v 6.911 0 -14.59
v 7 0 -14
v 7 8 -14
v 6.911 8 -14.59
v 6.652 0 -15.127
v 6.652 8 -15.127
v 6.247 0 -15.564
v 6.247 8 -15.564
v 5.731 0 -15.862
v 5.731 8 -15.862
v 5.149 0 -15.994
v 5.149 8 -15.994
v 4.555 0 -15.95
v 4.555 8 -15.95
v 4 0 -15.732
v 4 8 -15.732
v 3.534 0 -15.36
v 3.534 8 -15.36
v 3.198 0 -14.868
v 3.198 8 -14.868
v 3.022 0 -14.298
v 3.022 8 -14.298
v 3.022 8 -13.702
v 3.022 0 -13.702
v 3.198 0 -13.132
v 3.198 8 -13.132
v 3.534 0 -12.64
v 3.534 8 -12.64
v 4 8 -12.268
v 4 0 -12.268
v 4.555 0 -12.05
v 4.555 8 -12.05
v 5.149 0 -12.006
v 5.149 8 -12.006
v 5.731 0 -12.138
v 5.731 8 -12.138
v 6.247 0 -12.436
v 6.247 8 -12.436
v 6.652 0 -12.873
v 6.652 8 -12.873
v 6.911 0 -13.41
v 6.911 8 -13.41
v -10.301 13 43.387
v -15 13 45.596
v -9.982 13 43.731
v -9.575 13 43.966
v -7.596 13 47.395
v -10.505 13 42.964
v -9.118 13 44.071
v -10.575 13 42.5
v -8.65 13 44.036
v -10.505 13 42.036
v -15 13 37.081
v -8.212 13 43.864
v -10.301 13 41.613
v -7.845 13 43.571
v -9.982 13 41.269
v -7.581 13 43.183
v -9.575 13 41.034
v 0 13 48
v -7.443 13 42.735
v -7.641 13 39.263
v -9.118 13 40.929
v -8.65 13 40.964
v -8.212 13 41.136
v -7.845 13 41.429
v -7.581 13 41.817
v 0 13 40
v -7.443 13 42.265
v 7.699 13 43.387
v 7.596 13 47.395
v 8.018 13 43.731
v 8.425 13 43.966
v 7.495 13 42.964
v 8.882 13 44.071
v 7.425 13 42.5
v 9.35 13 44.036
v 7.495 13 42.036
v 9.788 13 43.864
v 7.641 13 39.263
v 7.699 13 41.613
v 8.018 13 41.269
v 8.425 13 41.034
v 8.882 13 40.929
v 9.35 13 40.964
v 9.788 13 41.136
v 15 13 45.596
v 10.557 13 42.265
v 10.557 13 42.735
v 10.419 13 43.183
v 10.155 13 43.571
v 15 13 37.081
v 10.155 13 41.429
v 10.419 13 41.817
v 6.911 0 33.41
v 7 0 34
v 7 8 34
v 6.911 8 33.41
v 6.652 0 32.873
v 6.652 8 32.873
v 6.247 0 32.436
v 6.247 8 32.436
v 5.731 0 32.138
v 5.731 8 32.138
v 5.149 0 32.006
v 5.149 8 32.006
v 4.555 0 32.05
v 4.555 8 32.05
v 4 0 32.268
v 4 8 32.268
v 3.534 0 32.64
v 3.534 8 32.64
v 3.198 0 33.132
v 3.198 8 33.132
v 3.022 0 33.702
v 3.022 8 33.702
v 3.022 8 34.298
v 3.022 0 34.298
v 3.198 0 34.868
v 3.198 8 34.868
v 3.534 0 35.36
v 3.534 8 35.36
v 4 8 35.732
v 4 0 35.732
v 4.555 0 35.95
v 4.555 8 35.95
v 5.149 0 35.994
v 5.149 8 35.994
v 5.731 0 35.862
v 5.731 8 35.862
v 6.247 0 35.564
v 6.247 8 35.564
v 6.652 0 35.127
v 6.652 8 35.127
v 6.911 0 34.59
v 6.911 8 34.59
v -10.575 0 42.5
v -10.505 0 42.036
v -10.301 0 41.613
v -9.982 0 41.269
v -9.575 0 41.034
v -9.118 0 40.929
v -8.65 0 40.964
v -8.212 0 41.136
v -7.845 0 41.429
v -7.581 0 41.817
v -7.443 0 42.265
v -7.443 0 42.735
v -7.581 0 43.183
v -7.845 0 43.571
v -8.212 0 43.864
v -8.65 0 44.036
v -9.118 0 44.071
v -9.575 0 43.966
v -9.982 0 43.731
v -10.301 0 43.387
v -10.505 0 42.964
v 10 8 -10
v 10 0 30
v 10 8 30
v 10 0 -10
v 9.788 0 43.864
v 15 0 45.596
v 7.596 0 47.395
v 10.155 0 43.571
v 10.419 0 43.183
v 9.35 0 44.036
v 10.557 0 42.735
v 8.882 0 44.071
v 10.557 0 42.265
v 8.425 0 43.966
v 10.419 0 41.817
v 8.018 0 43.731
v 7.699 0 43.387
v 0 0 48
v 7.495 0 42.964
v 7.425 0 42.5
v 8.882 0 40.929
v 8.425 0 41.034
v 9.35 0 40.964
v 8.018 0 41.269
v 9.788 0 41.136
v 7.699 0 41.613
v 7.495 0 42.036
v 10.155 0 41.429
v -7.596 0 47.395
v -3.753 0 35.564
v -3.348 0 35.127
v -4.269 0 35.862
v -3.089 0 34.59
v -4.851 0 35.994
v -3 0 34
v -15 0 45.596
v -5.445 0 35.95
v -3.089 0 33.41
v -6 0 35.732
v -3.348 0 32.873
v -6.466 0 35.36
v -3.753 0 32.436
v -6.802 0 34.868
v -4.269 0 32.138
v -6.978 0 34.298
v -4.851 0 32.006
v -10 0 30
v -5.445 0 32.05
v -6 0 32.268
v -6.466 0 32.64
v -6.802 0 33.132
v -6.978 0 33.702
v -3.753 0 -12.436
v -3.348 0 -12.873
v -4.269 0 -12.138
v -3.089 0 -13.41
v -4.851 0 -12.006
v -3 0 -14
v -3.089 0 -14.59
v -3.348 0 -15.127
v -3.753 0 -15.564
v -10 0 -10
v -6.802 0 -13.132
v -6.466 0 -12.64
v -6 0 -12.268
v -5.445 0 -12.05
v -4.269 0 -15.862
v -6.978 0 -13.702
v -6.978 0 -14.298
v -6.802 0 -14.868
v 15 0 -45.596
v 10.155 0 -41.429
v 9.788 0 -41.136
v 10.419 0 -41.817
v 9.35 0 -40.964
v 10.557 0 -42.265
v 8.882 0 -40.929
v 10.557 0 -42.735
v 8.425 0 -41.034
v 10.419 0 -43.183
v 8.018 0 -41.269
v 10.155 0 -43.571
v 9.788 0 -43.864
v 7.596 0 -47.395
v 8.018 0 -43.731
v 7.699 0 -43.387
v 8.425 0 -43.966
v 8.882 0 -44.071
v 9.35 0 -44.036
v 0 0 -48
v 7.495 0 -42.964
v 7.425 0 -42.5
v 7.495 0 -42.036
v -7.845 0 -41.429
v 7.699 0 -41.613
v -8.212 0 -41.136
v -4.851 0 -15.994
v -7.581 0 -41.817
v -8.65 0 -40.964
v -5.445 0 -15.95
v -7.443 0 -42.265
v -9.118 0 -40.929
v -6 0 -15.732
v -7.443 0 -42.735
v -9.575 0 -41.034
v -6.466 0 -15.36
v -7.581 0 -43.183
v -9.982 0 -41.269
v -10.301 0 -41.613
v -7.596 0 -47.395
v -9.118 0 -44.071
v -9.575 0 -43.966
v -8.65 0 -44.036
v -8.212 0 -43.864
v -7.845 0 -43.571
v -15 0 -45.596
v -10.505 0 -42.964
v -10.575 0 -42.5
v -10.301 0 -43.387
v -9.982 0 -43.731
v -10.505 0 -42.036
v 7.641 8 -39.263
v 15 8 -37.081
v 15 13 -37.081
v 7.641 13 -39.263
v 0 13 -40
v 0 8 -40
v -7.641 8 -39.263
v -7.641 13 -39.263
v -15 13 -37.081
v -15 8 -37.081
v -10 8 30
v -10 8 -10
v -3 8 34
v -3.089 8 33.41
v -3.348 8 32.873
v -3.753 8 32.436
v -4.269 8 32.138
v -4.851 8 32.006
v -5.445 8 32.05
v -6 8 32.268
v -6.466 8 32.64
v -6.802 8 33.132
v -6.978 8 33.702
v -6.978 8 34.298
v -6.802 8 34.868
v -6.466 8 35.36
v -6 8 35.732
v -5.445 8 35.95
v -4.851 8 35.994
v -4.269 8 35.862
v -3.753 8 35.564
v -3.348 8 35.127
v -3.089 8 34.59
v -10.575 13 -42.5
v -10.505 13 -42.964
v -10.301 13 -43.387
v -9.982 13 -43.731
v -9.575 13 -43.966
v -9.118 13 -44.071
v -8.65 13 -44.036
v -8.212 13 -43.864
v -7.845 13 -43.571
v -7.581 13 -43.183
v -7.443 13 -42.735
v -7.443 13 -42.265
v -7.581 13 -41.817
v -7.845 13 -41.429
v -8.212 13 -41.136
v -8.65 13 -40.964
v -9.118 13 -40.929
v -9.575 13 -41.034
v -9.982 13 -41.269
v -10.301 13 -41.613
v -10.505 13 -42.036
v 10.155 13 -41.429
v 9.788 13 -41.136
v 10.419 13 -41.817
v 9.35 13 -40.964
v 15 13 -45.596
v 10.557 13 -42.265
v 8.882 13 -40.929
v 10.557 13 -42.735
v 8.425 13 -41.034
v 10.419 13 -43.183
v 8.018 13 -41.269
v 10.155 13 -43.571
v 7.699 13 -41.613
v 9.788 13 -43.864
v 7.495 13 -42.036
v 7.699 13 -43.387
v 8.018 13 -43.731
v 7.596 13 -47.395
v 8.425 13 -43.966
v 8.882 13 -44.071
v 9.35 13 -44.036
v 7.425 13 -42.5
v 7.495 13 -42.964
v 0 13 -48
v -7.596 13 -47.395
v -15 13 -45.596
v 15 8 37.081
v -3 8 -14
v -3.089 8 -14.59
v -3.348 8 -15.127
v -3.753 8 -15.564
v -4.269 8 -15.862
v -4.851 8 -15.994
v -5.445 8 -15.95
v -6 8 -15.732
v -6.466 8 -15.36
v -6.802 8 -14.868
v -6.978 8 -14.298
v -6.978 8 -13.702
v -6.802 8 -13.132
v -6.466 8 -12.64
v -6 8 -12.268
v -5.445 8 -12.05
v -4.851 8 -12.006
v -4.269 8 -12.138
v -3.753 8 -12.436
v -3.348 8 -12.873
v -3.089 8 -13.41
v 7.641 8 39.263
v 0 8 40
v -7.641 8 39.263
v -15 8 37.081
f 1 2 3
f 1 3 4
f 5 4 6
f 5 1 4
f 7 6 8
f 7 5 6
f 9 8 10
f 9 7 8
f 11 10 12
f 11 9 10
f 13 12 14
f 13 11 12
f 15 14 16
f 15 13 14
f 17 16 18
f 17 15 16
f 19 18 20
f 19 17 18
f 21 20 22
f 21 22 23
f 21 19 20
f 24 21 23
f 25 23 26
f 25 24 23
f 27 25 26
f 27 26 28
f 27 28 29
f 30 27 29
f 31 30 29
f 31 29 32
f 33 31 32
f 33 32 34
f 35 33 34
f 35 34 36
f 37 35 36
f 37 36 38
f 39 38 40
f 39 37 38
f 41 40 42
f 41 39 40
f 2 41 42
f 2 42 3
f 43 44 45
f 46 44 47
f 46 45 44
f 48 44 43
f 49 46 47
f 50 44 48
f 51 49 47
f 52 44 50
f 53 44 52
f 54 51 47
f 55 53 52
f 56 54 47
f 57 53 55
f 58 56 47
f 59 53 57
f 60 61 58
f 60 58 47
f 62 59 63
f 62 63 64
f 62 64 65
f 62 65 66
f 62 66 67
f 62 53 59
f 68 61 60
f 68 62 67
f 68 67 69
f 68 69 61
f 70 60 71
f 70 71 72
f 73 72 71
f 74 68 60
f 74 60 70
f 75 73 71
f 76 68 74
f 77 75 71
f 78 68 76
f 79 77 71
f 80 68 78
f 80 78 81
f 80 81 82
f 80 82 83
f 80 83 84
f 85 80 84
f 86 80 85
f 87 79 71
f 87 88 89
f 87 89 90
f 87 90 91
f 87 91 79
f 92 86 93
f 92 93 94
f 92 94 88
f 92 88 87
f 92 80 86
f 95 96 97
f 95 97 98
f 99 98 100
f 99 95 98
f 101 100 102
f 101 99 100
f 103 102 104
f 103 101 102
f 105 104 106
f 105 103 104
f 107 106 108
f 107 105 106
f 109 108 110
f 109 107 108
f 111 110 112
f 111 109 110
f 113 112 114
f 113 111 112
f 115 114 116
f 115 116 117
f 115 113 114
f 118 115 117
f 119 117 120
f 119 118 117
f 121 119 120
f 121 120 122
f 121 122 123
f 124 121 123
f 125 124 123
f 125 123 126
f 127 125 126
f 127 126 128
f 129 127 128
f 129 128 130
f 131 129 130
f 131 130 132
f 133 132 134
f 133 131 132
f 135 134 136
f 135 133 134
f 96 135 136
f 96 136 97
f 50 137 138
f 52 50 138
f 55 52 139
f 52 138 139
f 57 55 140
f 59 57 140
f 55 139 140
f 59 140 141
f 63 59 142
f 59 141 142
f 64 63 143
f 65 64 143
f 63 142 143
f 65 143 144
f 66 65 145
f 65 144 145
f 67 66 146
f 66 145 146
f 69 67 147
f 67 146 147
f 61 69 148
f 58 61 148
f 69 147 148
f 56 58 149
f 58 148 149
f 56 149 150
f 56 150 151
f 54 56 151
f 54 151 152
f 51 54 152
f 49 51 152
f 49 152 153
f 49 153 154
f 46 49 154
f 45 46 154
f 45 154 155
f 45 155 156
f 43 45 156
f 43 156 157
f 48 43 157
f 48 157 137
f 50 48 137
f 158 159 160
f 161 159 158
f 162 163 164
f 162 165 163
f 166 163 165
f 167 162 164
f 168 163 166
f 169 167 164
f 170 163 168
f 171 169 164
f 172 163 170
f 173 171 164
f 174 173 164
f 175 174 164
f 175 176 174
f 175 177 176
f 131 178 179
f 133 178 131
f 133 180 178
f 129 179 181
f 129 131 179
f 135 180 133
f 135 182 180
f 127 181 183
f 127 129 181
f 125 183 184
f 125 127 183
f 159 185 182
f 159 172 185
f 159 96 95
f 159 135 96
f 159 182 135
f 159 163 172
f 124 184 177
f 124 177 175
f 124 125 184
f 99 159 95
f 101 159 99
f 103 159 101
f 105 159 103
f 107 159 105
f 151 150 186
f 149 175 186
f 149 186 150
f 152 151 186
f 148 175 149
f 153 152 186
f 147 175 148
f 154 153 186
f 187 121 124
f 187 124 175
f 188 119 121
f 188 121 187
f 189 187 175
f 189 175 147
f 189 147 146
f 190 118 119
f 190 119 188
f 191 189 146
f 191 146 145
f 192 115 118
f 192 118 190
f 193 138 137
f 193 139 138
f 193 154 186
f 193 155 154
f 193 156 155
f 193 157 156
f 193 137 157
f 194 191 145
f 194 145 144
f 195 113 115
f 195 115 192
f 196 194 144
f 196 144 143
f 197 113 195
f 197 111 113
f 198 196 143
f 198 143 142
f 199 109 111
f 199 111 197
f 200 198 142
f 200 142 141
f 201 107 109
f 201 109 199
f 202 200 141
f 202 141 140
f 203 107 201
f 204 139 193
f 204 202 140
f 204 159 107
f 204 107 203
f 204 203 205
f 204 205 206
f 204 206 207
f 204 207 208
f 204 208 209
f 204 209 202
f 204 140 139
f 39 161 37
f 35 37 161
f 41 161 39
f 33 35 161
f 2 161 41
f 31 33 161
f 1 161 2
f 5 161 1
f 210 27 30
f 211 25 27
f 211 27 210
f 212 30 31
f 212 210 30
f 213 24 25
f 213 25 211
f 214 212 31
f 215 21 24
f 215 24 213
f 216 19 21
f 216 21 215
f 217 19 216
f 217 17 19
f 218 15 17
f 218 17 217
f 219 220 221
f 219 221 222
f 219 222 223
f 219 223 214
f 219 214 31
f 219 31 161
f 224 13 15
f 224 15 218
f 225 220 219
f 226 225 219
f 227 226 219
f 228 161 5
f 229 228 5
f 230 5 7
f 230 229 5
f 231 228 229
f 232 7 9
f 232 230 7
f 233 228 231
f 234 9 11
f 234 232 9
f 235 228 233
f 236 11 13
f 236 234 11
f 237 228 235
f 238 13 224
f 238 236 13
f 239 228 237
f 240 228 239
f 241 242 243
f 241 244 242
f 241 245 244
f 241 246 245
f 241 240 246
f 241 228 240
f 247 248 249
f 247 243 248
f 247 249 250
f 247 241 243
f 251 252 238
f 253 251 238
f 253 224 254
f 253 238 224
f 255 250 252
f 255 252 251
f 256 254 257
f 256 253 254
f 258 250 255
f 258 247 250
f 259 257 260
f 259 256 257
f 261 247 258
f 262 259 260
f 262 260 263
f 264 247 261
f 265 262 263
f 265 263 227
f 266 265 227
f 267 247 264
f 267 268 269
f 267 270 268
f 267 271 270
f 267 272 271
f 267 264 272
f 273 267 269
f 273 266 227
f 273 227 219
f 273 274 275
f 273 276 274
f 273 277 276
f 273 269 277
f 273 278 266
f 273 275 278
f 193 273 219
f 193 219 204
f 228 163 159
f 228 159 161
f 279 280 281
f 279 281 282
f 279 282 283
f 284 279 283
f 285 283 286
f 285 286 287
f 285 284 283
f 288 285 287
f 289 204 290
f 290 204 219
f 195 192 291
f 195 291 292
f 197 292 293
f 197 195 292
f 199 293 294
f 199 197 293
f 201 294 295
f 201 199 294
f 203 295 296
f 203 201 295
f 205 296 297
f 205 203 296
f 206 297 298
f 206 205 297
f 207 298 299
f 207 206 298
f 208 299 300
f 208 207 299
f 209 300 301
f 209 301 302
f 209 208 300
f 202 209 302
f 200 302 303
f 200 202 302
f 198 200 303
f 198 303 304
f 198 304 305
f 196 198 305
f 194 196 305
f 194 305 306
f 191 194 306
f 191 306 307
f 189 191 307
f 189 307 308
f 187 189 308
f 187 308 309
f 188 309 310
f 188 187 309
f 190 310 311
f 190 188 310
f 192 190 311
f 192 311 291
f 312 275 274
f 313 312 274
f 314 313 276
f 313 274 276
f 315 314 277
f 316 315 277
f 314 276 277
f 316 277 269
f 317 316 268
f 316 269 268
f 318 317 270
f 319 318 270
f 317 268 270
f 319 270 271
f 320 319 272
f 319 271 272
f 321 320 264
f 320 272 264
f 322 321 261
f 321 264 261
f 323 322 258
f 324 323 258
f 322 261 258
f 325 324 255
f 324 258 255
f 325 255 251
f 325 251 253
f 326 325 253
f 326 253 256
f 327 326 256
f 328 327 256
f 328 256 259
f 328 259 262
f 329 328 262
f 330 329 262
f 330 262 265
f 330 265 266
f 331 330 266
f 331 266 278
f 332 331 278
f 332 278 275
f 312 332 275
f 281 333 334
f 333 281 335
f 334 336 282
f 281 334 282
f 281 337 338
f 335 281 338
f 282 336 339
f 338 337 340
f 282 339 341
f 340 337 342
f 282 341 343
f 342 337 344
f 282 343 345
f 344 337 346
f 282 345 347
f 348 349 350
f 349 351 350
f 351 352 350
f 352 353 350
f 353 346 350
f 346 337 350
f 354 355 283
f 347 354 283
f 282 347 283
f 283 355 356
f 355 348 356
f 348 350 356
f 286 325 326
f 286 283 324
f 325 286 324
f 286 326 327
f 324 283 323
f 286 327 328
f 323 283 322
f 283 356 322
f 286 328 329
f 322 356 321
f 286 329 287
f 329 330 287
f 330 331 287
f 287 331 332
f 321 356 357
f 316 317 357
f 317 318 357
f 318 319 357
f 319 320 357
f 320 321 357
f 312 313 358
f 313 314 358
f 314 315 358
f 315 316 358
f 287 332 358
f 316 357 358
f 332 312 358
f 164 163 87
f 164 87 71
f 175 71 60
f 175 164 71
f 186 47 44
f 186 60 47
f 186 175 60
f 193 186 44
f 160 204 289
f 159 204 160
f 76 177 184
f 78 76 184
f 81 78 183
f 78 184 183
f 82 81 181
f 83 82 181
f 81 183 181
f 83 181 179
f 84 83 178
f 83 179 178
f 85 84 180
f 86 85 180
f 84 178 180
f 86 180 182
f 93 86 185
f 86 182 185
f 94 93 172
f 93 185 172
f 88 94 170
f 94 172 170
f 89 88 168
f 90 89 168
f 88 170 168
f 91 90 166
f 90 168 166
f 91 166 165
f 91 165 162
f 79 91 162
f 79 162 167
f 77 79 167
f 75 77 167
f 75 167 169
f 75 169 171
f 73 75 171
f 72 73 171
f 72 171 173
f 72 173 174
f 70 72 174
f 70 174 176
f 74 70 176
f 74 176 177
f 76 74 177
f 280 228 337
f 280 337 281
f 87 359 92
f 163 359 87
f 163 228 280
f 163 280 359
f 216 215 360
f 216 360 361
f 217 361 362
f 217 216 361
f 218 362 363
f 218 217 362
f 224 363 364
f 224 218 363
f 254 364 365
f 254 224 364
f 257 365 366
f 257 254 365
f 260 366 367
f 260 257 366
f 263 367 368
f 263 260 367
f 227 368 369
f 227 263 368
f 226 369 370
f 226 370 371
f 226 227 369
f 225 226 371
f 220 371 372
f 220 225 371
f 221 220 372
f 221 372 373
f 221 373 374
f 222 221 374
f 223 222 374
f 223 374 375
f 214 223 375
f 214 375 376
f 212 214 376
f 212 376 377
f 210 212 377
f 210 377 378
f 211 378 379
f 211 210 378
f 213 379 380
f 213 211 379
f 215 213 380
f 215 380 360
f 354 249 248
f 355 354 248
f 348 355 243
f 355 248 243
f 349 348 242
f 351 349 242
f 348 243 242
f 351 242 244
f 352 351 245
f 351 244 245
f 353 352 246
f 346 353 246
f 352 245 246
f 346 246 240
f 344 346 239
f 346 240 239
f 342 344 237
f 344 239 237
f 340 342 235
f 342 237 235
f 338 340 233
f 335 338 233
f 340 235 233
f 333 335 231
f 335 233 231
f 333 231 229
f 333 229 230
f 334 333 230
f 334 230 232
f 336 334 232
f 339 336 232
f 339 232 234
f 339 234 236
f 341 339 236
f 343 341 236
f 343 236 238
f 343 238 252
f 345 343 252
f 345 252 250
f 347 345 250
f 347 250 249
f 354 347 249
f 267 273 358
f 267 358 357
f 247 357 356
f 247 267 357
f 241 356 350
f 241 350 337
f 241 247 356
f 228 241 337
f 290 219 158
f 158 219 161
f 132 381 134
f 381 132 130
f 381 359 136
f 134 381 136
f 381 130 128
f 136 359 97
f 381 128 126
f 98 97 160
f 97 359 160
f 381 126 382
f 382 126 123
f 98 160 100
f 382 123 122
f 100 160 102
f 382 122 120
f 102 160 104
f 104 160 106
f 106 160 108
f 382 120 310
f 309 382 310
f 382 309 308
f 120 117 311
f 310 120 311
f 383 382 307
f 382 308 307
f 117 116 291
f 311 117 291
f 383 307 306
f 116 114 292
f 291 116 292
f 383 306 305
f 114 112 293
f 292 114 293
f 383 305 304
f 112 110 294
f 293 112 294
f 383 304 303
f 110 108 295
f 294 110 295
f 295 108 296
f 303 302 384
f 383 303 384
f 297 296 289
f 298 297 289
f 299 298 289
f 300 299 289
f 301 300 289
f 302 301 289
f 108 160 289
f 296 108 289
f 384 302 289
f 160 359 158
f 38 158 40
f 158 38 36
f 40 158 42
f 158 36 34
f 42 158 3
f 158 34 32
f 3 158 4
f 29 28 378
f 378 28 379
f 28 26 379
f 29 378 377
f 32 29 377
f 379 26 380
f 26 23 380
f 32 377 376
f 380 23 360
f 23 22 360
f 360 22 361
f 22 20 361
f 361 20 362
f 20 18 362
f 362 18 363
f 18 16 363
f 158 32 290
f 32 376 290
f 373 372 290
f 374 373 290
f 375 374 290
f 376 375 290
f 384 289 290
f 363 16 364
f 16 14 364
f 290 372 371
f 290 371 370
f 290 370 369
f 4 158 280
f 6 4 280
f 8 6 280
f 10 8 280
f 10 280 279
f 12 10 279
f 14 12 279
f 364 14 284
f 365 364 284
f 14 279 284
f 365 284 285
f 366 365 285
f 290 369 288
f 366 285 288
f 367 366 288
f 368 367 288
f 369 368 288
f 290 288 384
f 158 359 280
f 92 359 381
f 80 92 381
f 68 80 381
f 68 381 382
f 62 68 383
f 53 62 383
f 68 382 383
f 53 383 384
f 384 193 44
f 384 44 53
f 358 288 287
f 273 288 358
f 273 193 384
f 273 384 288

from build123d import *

# Parameters (mm, degrees)
SKETCH_1_R                  = 2
SKETCH_1_W                  = 20
SKETCH_1_H                  = 40
EXTRUDE_1_DEPTH             = 8
EXTRUDE_2_DEPTH             = 5
HOLE_WIZARD_M31_D           = 3.15
PATTERN_LINEAR_1_COUNT      = 2
PATTERN_LINEAR_1_PITCH      = 18
PATTERN_LINEAR_1_COUNT_DIR2 = 2
PATTERN_LINEAR_1_PITCH_DIR2 = 85


with BuildPart() as part:
    # Эскиз1 → Бобышка-Вытянуть1 (new body)
    with BuildSketch(Plane(origin=(0, 0, 0), x_dir=(1, 0, 0), z_dir=(0, 1, 0))):
        with BuildLine():
            Line((-15, -45.596052461), (-15, 45.596052461))
            ThreePointArc((-15, 45.596052461), (0, 48), (15, 45.596052461))
            Line((15, 45.596052461), (15, -45.596052461))
            ThreePointArc((15, -45.596052461), (0, -48), (-15, -45.596052461))
        make_face()
        with Locations((-5, -34)):
            Circle(SKETCH_1_R, mode=Mode.SUBTRACT)
        with Locations((5, -34)):
            Circle(SKETCH_1_R, mode=Mode.SUBTRACT)
        with Locations((5, 14)):
            Circle(SKETCH_1_R, mode=Mode.SUBTRACT)
        with Locations((-5, 14)):
            Circle(SKETCH_1_R, mode=Mode.SUBTRACT)
        with Locations((0, -10)):
            Rectangle(SKETCH_1_W, SKETCH_1_H, mode=Mode.SUBTRACT)
    extrude(amount=EXTRUDE_1_DEPTH)

    # Эскиз2 → Бобышка-Вытянуть2 (add)
    with BuildSketch(Plane(origin=(0, 8, 0), x_dir=(1, 0, 0), z_dir=(0, 1, 0))):
        with BuildLine():
            Line((-15, 37.080992435), (-15, 45.596052461))
            ThreePointArc((-15, 45.596052461), (0, 48), (15, 45.596052461))
            Line((15, 45.596052461), (15, 37.080992435))
            ThreePointArc((15, 37.080992435), (0, 40), (-15, 37.080992435))
        make_face()
        with BuildLine():
            Line((-15, -37.080992435), (-15, -45.596052461))
            ThreePointArc((-15, -45.596052461), (0, -48), (15, -45.596052461))
            Line((15, -45.596052461), (15, -37.080992435))
            ThreePointArc((15, -37.080992435), (0, -40), (-15, -37.080992435))
        make_face()
    extrude(amount=EXTRUDE_2_DEPTH)

    # Сверло под метчик  спиральное M31 (through all)
    with Locations(Plane(origin=(0, 13, 0), x_dir=(1, 0, 0), z_dir=(0, 1, 0))):
        with Locations((-9, -42.5)):
            hole_wizard_m31 = Hole(HOLE_WIZARD_M31_D / 2)

    # Линейный массив1: Hole Wizard M31 2 × 2
    with Locations(*[(i * PATTERN_LINEAR_1_PITCH, 0, -j * PATTERN_LINEAR_1_PITCH_DIR2) for i in range(PATTERN_LINEAR_1_COUNT) for j in range(PATTERN_LINEAR_1_COUNT_DIR2) if (i, j) != (0, 0)]):
        add(hole_wizard_m31, mode=Mode.SUBTRACT)


solid = part.part
